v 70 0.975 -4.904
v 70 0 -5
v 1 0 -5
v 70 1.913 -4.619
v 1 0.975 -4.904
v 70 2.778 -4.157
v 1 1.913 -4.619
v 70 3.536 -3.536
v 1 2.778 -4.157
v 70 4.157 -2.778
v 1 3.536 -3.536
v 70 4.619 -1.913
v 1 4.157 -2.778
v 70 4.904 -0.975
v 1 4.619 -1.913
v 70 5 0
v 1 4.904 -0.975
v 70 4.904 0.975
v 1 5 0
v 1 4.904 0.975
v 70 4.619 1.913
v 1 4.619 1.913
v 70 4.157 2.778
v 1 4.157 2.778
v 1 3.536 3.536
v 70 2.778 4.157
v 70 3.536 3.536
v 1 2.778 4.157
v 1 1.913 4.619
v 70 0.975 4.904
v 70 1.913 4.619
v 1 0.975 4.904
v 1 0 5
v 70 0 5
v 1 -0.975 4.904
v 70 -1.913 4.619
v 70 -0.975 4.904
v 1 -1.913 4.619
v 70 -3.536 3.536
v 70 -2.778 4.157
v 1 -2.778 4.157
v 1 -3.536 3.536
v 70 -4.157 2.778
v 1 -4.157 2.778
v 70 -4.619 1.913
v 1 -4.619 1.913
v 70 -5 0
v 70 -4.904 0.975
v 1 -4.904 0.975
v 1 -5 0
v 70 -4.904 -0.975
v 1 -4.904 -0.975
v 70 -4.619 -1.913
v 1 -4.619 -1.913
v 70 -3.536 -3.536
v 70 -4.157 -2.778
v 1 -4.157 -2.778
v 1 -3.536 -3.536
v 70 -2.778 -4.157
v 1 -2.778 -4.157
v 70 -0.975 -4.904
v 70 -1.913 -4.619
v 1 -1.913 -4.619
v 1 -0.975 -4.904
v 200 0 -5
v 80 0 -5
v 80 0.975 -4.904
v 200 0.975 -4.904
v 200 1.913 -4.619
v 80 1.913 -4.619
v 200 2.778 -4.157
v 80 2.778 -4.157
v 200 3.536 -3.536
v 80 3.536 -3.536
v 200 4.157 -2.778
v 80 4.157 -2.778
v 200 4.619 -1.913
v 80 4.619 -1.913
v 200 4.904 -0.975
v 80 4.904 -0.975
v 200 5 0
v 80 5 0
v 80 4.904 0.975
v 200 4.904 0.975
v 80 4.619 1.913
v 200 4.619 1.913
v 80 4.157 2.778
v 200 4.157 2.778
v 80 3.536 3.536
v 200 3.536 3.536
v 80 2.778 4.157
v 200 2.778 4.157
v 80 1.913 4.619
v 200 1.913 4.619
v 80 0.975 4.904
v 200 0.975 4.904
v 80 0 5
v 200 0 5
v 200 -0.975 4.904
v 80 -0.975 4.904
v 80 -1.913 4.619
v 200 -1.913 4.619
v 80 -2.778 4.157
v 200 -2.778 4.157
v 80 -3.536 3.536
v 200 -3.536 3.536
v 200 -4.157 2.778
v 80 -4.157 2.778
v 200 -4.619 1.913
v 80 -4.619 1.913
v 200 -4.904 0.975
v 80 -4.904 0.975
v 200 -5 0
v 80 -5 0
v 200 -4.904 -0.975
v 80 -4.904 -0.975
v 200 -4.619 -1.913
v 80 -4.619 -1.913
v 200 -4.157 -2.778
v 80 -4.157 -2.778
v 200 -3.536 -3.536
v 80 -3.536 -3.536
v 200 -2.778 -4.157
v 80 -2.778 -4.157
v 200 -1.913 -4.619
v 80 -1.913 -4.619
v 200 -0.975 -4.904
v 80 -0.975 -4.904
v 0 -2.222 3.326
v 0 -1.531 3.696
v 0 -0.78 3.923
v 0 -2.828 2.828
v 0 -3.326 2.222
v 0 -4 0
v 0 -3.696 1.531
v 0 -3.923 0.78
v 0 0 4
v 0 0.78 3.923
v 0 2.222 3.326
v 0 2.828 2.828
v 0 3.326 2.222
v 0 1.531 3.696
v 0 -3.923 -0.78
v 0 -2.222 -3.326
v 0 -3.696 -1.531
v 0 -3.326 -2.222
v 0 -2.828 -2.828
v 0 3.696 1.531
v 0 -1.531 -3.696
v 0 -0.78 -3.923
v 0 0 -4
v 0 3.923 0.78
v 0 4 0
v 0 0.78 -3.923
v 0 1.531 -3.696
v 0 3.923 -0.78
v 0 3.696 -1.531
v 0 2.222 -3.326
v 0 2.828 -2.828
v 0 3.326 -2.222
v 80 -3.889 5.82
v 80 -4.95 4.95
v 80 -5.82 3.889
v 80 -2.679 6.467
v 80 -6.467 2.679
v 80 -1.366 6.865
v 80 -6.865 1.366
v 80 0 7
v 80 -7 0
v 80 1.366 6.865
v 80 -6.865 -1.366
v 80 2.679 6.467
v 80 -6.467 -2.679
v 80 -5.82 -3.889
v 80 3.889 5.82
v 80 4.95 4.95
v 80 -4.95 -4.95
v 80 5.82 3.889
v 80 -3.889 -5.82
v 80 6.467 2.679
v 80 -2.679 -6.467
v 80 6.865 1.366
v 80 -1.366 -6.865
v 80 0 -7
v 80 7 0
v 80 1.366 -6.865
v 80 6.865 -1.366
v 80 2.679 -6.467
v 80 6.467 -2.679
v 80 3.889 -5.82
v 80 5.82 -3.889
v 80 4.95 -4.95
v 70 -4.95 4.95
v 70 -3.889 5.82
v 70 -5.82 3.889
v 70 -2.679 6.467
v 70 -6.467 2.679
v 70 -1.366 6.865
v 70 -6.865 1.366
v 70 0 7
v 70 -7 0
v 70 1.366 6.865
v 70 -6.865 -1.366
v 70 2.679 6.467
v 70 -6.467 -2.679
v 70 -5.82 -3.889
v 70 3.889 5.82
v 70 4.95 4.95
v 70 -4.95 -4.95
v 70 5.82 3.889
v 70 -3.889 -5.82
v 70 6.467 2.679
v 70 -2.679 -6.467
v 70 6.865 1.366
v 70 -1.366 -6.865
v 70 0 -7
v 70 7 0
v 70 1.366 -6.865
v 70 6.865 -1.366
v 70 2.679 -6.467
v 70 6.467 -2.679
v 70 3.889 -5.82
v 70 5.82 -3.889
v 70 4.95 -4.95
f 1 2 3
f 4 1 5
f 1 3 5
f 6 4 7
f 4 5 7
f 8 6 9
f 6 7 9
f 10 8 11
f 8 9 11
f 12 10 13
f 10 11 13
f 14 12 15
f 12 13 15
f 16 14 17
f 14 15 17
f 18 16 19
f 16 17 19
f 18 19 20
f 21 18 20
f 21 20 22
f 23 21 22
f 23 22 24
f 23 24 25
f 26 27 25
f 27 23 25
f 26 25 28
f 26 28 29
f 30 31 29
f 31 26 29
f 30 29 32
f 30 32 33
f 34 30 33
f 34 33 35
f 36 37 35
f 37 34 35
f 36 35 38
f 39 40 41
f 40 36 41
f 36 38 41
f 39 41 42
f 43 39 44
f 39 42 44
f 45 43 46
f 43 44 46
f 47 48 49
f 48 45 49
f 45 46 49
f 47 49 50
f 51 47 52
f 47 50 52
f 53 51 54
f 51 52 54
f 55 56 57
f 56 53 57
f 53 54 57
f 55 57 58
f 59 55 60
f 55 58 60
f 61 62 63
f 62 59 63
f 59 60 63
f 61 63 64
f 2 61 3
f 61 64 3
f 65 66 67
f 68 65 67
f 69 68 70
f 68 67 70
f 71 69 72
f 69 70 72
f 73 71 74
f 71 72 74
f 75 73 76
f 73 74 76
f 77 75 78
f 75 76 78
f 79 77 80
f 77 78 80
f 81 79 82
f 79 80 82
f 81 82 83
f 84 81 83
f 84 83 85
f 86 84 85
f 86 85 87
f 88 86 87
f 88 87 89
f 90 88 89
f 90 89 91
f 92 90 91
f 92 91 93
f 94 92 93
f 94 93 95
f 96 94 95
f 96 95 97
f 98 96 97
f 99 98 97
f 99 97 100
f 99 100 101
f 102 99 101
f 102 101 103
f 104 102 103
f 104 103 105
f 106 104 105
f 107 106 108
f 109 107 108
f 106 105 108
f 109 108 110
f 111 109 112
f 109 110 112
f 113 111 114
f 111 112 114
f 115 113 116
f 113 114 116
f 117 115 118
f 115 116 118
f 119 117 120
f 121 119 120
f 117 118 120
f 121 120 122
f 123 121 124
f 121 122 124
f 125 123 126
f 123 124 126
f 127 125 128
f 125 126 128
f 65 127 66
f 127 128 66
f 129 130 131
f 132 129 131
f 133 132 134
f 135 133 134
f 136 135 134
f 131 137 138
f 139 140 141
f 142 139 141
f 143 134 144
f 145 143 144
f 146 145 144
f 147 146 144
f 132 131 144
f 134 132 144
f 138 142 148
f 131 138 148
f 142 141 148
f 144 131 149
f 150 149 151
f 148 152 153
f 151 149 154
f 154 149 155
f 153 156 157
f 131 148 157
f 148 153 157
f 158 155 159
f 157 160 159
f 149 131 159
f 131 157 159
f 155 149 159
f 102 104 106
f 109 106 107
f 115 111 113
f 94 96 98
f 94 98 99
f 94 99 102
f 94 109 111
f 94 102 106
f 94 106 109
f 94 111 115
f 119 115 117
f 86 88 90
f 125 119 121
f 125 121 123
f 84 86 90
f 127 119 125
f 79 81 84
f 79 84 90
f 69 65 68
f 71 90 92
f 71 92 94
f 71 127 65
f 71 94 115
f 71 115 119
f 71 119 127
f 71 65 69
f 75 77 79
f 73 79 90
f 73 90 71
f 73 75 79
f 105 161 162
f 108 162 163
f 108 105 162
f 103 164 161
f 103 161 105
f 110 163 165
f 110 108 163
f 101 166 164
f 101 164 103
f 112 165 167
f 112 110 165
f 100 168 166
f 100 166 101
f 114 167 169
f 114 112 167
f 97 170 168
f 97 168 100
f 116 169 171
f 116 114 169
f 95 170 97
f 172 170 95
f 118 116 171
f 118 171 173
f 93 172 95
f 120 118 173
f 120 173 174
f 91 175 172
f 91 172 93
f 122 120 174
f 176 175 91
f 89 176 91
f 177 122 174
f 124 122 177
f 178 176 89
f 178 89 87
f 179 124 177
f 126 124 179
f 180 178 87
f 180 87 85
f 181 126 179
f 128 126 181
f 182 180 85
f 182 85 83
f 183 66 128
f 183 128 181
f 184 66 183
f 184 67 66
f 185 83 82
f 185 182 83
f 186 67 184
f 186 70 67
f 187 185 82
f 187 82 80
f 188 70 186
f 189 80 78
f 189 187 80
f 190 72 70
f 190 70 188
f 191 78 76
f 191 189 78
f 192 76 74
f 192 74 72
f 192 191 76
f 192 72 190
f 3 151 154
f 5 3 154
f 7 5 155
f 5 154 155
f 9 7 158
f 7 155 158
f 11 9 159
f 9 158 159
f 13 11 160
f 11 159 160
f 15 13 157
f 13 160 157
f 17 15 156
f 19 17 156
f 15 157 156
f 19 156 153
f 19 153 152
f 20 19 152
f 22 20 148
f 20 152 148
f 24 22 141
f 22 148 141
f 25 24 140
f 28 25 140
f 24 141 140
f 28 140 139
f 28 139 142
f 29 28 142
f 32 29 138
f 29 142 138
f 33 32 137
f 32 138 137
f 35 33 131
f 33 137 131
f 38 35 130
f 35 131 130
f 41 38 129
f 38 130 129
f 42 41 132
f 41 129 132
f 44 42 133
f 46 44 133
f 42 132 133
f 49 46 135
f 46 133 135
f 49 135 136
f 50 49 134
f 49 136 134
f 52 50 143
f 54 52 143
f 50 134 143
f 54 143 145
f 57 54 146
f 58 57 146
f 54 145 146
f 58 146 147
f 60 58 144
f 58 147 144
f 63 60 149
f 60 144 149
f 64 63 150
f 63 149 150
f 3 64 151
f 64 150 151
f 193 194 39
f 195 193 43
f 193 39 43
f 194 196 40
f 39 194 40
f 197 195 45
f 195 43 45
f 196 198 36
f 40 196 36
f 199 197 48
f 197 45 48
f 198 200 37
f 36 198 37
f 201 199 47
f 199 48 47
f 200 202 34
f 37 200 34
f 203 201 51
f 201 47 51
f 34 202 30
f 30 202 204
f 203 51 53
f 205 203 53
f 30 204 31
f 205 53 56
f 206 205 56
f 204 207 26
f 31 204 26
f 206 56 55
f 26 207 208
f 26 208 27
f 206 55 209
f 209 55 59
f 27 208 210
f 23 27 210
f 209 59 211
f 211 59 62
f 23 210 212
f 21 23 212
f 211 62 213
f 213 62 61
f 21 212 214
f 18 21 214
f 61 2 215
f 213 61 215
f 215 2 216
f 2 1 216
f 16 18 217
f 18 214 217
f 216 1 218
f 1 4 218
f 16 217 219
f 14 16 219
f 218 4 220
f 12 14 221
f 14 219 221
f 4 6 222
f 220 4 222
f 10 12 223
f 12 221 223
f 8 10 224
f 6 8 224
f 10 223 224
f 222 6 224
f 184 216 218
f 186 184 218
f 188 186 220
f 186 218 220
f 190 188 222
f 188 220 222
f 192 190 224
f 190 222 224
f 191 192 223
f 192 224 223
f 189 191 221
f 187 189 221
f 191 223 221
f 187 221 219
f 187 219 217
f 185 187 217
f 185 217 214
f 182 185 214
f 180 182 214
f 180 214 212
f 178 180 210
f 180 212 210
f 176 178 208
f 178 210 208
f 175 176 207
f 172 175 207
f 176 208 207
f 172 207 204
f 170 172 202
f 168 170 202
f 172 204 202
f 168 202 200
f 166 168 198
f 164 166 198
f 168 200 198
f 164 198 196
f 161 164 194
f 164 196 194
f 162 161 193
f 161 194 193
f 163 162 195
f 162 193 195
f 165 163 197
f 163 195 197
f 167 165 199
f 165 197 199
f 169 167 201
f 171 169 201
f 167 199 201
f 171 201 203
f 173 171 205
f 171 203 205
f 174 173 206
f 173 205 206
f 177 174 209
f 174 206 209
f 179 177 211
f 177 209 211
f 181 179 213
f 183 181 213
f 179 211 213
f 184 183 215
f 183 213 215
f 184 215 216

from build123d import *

# Parameters (mm, degrees)
SKETCH1_R           = 5
BOSS_EXTRUDE1_DEPTH = 200
CHAMFER1_SIZE       = 1
BOSS_EXTRUDE2_START = 70
SKETCH2_R           = 7
BOSS_EXTRUDE2_DEPTH = 10


with BuildPart() as part:
    # Sketch1 → Boss-Extrude1 (new body)
    with BuildSketch(Plane(origin=(0, 0, 0), x_dir=(0, 0, -1), z_dir=(1, 0, 0))):
        Circle(SKETCH1_R)
    extrude(amount=BOSS_EXTRUDE1_DEPTH)

    # Chamfer1
    chamfer1_edges = [part.edges().sort_by_distance(p)[0] for p in [
        (0, 0, 5),
    ]]
    chamfer(chamfer1_edges, length=CHAMFER1_SIZE)

    # Sketch2 → Boss-Extrude2 (add)
    with BuildSketch(Plane(origin=(0, 0, 0), x_dir=(0, 0, -1), z_dir=(1, 0, 0)).offset(BOSS_EXTRUDE2_START)):
        Circle(SKETCH2_R)
    extrude(amount=BOSS_EXTRUDE2_DEPTH)


solid = part.part
